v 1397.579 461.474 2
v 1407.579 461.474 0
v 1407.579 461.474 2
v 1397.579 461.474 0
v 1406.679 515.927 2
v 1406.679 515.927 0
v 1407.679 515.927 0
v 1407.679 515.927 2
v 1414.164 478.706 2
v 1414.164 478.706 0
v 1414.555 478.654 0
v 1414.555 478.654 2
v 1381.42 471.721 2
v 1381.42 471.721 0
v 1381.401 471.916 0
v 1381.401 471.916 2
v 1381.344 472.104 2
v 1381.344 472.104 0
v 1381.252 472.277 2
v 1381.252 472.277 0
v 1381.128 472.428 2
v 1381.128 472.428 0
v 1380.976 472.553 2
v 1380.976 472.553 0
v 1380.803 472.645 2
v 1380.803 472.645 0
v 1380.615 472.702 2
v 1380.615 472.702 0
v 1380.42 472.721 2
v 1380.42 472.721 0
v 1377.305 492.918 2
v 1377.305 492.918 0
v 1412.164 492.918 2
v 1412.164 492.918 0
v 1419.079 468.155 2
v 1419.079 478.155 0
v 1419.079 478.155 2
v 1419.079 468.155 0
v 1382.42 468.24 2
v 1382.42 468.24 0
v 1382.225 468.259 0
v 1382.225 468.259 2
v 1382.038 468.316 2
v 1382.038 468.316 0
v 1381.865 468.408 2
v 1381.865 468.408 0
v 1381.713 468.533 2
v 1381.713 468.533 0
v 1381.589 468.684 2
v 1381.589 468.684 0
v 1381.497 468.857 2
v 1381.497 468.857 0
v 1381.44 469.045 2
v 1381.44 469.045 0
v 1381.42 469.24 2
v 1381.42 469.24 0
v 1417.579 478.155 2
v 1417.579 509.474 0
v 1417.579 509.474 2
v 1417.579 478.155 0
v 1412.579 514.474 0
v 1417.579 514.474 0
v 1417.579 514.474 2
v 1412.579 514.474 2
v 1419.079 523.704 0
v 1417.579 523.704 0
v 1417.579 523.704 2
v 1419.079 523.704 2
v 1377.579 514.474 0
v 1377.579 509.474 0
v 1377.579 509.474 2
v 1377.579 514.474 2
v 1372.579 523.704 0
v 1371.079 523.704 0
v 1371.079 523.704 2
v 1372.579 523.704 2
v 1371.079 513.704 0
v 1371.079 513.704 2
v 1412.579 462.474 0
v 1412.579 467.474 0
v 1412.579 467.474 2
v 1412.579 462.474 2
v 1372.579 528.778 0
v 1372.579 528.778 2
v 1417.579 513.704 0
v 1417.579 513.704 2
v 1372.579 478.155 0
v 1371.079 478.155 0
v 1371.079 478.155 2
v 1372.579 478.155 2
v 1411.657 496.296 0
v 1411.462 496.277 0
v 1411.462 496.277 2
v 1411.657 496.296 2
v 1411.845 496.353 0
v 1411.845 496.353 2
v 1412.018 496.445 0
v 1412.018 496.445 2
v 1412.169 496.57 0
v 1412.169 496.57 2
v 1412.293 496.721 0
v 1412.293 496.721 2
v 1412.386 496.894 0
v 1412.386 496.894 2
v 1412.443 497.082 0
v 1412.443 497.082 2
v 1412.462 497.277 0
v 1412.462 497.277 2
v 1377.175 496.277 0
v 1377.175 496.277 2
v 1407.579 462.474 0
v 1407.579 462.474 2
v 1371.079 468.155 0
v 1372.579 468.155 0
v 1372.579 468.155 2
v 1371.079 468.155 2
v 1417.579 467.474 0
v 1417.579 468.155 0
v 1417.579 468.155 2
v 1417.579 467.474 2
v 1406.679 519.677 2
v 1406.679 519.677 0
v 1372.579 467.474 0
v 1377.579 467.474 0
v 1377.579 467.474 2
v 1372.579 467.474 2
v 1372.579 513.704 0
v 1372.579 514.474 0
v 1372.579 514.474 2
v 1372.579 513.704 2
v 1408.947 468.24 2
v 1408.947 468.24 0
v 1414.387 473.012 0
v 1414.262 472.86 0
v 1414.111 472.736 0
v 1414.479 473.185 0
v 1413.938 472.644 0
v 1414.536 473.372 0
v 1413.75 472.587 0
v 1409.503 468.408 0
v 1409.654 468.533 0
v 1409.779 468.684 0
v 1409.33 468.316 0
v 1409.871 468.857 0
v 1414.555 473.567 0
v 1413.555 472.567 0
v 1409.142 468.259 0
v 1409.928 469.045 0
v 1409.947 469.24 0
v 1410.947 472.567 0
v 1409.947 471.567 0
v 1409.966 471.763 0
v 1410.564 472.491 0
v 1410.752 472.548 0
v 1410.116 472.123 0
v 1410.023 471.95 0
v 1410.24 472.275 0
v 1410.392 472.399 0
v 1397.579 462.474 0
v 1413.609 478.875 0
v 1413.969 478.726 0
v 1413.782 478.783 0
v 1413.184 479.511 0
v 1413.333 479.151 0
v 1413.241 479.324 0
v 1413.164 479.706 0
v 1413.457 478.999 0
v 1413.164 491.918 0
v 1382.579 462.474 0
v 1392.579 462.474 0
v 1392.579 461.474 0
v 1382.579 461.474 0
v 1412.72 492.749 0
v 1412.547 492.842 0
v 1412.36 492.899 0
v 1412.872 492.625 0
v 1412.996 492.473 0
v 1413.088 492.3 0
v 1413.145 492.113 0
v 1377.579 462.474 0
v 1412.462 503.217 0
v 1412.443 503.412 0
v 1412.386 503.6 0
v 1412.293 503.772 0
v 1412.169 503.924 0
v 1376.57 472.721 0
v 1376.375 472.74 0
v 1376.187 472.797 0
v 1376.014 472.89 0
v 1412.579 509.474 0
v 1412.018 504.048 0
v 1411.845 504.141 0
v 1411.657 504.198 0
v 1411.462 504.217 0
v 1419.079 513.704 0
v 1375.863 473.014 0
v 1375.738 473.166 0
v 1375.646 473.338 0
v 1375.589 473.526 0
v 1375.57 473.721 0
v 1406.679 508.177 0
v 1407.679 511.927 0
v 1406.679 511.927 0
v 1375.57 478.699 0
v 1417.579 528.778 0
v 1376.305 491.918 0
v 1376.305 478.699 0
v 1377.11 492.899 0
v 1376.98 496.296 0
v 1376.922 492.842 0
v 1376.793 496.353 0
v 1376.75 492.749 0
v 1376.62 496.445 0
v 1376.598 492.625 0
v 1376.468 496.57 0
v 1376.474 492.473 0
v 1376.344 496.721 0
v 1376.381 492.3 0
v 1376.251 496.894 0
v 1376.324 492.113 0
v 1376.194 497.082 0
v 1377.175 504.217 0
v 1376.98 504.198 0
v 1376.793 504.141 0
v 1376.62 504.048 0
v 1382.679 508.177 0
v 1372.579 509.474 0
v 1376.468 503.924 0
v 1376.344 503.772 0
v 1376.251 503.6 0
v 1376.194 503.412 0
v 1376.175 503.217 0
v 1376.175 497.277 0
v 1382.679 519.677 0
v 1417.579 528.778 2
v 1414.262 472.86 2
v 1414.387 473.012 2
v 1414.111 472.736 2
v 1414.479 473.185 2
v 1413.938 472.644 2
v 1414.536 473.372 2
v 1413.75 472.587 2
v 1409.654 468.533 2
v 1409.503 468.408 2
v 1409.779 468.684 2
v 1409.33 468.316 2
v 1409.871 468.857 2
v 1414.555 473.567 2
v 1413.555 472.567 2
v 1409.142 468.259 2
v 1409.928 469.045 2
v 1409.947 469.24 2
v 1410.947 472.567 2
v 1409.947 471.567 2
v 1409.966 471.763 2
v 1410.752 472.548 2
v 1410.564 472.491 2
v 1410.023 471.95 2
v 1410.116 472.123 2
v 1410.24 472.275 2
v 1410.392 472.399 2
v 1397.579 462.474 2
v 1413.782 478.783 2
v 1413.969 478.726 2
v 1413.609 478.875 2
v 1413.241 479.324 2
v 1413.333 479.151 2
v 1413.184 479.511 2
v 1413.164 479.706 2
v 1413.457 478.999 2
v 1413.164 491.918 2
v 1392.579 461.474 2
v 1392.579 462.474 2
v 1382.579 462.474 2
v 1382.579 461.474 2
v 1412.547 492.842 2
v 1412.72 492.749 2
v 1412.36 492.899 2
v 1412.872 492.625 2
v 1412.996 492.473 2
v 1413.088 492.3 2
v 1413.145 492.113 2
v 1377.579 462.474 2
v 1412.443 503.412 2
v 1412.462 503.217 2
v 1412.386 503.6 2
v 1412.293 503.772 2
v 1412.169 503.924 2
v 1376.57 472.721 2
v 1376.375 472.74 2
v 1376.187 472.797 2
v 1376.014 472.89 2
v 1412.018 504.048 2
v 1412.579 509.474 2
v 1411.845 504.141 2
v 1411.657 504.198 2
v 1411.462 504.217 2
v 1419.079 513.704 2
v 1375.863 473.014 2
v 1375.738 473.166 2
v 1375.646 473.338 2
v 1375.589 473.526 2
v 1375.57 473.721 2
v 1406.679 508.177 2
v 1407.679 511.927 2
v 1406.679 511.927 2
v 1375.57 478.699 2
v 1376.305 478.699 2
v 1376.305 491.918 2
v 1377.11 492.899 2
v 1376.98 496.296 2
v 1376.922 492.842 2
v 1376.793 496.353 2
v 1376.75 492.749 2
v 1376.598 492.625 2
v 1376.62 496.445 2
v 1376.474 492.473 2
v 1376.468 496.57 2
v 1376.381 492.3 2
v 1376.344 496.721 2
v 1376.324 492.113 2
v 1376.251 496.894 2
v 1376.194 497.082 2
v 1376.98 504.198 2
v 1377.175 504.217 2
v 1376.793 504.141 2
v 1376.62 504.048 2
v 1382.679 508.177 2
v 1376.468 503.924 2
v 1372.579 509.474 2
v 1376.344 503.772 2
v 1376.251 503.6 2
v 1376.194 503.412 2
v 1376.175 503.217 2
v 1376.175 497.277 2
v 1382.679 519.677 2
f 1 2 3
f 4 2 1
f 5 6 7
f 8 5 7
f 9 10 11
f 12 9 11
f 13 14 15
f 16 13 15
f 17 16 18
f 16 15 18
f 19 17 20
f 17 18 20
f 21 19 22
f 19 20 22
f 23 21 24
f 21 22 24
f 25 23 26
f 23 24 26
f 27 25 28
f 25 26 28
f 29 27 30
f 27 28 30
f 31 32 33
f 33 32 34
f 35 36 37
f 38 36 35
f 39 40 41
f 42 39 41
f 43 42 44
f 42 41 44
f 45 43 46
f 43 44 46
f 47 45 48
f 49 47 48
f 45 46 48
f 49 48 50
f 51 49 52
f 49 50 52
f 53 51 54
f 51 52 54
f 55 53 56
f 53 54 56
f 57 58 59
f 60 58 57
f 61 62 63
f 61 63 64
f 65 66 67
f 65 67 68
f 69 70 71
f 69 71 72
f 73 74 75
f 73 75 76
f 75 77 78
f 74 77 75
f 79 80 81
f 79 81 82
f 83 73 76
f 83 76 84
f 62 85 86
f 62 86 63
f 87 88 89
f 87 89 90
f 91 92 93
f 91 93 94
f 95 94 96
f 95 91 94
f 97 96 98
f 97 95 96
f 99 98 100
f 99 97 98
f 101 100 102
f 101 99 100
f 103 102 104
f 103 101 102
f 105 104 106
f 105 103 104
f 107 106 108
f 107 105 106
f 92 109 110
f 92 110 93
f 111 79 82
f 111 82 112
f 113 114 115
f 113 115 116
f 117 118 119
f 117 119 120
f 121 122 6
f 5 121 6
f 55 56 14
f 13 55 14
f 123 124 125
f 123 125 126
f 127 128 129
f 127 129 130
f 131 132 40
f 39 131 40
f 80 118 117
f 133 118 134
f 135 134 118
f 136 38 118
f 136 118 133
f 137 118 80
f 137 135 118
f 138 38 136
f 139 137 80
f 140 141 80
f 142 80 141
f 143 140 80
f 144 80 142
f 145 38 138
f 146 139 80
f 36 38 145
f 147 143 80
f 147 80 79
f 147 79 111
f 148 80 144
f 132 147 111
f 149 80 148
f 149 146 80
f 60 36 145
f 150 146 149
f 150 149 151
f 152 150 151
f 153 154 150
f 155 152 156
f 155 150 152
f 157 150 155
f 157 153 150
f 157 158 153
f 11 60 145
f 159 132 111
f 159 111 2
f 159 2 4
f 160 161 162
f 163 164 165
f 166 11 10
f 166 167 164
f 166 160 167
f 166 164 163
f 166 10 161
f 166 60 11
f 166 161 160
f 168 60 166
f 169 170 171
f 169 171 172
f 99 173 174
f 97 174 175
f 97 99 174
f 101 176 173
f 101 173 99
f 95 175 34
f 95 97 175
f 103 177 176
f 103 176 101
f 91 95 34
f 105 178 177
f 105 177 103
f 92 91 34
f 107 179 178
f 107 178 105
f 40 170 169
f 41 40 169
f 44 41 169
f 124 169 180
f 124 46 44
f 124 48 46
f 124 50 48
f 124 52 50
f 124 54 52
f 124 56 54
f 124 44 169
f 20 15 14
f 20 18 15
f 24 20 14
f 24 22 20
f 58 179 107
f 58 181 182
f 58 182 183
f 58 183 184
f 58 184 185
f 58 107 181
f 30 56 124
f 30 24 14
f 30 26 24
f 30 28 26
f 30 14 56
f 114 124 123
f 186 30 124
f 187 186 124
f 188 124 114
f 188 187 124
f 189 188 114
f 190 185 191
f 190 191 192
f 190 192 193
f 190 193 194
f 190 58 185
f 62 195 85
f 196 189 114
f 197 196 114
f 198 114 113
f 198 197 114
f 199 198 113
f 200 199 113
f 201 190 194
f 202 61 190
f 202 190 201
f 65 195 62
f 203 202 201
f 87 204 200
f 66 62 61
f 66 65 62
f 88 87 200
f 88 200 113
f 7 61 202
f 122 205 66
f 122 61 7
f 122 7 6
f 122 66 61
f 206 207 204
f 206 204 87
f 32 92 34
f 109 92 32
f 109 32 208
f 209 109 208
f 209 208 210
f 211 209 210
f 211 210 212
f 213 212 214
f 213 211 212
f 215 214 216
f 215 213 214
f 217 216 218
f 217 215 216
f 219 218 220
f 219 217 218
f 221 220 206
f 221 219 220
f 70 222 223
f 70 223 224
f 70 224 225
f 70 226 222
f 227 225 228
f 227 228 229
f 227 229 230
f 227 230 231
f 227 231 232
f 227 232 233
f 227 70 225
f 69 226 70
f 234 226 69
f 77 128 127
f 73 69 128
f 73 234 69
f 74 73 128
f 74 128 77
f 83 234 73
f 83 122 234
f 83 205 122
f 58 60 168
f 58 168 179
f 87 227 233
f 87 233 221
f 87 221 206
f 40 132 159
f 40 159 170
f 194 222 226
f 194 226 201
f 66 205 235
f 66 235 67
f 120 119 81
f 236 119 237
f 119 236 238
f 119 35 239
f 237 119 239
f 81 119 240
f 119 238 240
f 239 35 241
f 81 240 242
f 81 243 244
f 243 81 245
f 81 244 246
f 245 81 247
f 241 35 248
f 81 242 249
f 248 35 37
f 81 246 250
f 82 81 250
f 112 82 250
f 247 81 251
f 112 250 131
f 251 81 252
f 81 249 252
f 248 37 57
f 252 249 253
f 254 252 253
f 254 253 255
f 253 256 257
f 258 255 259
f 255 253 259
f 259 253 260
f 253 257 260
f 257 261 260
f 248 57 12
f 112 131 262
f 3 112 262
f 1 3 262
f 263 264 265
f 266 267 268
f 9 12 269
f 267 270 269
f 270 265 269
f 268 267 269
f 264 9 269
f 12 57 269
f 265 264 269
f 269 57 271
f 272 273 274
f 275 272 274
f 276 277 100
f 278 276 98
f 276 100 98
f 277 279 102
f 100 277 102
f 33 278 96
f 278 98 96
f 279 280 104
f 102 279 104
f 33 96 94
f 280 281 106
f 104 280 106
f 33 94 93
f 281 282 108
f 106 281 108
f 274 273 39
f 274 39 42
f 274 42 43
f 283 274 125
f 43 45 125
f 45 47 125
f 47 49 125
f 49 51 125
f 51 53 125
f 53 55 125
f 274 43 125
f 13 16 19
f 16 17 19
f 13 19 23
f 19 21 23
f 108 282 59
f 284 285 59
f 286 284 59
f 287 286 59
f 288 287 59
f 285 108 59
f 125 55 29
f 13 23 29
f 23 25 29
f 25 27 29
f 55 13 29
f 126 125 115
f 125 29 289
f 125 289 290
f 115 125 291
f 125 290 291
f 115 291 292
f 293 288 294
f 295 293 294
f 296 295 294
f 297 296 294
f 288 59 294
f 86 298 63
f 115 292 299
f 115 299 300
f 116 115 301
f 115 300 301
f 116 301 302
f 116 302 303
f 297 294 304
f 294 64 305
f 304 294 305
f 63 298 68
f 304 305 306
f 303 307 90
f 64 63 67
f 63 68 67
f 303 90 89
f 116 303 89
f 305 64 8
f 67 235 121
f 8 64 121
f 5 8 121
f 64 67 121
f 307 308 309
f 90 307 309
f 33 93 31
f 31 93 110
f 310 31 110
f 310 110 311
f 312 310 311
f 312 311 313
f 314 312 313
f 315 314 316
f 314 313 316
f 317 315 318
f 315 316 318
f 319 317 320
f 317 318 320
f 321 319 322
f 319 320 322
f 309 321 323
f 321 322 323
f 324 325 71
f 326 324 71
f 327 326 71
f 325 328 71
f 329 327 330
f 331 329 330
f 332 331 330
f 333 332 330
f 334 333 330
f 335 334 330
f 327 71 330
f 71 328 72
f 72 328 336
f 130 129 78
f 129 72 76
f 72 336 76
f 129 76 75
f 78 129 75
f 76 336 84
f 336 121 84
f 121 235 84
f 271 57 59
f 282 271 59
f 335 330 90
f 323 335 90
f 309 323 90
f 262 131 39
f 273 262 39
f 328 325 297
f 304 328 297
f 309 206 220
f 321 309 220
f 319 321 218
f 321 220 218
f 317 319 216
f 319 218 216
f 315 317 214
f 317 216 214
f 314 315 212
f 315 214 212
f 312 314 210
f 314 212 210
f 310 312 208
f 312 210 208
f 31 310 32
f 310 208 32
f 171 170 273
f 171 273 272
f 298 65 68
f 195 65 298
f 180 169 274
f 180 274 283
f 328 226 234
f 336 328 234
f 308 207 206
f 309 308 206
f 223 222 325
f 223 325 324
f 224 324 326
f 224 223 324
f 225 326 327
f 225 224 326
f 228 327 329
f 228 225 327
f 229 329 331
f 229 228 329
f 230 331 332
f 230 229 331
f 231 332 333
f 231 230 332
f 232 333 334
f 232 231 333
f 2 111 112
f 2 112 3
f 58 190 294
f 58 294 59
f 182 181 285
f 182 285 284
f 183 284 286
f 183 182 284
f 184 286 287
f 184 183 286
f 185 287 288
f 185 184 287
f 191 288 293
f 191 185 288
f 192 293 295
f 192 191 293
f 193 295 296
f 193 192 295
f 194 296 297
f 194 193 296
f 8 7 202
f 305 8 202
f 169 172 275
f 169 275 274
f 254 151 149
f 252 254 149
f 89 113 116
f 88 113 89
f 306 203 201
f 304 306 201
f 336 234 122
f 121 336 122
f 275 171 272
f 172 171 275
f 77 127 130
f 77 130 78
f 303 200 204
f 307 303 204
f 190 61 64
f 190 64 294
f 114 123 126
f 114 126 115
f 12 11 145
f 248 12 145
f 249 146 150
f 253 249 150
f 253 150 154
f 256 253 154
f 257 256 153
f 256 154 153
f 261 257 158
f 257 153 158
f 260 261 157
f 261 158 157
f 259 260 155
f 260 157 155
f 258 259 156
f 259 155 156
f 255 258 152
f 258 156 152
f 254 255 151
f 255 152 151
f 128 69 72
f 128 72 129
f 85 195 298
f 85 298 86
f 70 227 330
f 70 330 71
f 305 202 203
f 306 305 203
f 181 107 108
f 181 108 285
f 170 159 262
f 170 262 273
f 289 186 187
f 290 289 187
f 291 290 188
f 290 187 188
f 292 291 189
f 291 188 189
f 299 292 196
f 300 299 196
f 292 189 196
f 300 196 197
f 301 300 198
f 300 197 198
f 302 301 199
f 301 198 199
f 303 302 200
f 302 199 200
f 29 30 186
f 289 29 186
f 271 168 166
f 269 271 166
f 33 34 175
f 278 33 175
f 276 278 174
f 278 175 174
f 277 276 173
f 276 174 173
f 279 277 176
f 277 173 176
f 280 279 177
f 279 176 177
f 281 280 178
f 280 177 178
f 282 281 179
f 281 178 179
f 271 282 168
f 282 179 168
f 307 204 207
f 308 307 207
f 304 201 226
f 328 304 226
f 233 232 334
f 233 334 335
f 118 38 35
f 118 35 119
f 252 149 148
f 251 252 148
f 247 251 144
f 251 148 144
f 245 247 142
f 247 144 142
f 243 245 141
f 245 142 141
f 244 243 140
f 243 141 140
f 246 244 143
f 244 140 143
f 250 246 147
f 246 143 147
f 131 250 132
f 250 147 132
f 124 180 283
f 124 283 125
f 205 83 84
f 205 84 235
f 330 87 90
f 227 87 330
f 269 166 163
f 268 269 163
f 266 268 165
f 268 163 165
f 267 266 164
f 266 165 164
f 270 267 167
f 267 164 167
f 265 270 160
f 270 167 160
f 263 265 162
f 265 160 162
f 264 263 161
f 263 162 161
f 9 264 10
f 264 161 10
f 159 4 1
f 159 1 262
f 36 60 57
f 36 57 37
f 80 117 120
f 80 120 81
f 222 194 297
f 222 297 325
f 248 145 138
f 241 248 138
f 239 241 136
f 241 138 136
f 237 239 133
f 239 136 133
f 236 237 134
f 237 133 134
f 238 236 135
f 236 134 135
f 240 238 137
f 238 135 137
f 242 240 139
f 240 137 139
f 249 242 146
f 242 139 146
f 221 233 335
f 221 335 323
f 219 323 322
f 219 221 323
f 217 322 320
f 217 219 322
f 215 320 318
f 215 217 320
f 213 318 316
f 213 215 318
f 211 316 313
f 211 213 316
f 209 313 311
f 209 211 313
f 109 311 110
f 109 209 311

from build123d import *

# Parameters (mm, degrees)
EXTRUDE_1_DEPTH = 2


with BuildPart() as part:
    # Model → 凸台-拉伸1 (new body)
    with BuildSketch(Plane.XY):
        Polygon((1417.579456282, 528.777626172), (1417.579456282, 523.704047707), (1419.079456282, 523.704047707), (1419.079456282, 513.704047707), (1417.579456282, 513.704047707), (1417.579456282, 514.474245762), (1412.579456282, 514.474245762), (1412.579456282, 509.474245762), (1417.579456282, 509.474245762), (1417.579456282, 478.155095762), (1419.079456282, 478.155095762), (1419.079456282, 468.155095762), (1417.579456282, 468.155095762), (1417.579456282, 467.474245762), (1412.579456282, 467.474245762), (1412.579456282, 462.474245762), (1407.579456282, 462.474245762), (1407.579456282, 461.474245762), (1397.579456282, 461.474245762), (1397.579456282, 462.474245762), (1392.579456282, 462.474245762), (1392.579456282, 461.474245762), (1382.579456282, 461.474245762), (1382.579456282, 462.474245762), (1377.579456282, 462.474245762), (1377.579456282, 467.474245762), (1372.579456282, 467.474245762), (1372.579456282, 468.155095762), (1371.079456282, 468.155095762), (1371.079456282, 478.155095762), (1372.579456282, 478.155095762), (1372.579456282, 509.474245762), (1377.579456282, 509.474245762), (1377.579456282, 514.474245762), (1372.579456282, 514.474245762), (1372.579456282, 513.704047707), (1371.079456282, 513.704047707), (1371.079456282, 523.704047707), (1372.579456282, 523.704047707), (1372.579456282, 528.777626172), align=None)
        with BuildLine():
            Line((1413.164476571, 491.917810861), (1413.164476571, 479.70647297))
            ThreePointArc((1413.164476571, 479.70647297), (1413.457369789, 478.999366189), (1414.164476571, 478.70647297))
            Line((1414.164476571, 478.70647297), (1414.555223152, 478.654447188))
            Line((1414.555223152, 478.654447188), (1414.555223152, 473.567457634))
            ThreePointArc((1414.555223152, 473.567457634), (1414.262329933, 472.860350852), (1413.555223152, 472.567457634))
            Line((1413.555223152, 472.567457634), (1410.947178647, 472.567457634))
            ThreePointArc((1410.947178647, 472.567457634), (1410.240071866, 472.274564415), (1409.947178647, 471.567457634))
            Line((1409.947178647, 471.567457634), (1409.947178647, 469.239749487))
            ThreePointArc((1409.947178647, 469.239749487), (1409.654285428, 468.532642706), (1408.947178647, 468.239749487))
            Line((1408.947178647, 468.239749487), (1382.420404996, 468.239749487))
            ThreePointArc((1382.420404996, 468.239749487), (1381.713298215, 468.532642706), (1381.420404996, 469.239749487))
            Line((1381.420404996, 469.239749487), (1381.420404996, 471.721090549))
            ThreePointArc((1381.420404996, 471.721090549), (1381.127511777, 472.428197331), (1380.420404996, 472.721090549))
            Line((1380.420404996, 472.721090549), (1376.569778947, 472.721090549))
            ThreePointArc((1376.569778947, 472.721090549), (1375.862672166, 473.013983768), (1375.569778947, 473.721090549))
            Line((1375.569778947, 473.721090549), (1375.569778947, 478.699498863))
            Line((1375.569778947, 478.699498863), (1376.305086446, 478.699498863))
            Line((1376.305086446, 478.699498863), (1376.305086446, 491.917810861))
            ThreePointArc((1376.305086446, 491.917810861), (1376.597979665, 492.624917642), (1377.305086446, 492.917810861))
            Line((1377.305086446, 492.917810861), (1412.164476571, 492.917810861))
            ThreePointArc((1412.164476571, 492.917810861), (1412.871583352, 492.624917642), (1413.164476571, 491.917810861))
        make_face(mode=Mode.SUBTRACT)
        Polygon((1382.679456282, 519.677225349), (1406.679456282, 519.677225349), (1406.679456282, 515.927225349), (1407.679456282, 515.927225349), (1407.679456282, 511.927225349), (1406.679456282, 511.927225349), (1406.679456282, 508.177225349), (1382.679456282, 508.177225349), align=None, mode=Mode.SUBTRACT)
        with BuildLine():
            Line((1411.462010719, 504.216917745), (1377.175235328, 504.216917745))
            ThreePointArc((1377.175235328, 504.216917745), (1376.468128547, 503.924024527), (1376.175235328, 503.216917745))
            Line((1376.175235328, 503.216917745), (1376.175235328, 497.276748548))
            ThreePointArc((1376.175235328, 497.276748548), (1376.468128547, 496.569641766), (1377.175235328, 496.276748548))
            Line((1377.175235328, 496.276748548), (1411.462010719, 496.276748548))
            ThreePointArc((1411.462010719, 496.276748548), (1412.1691175, 496.569641766), (1412.462010719, 497.276748548))
            Line((1412.462010719, 497.276748548), (1412.462010719, 503.216917745))
            ThreePointArc((1412.462010719, 503.216917745), (1412.1691175, 503.924024527), (1411.462010719, 504.216917745))
        make_face(mode=Mode.SUBTRACT)
    extrude(amount=EXTRUDE_1_DEPTH)


solid = part.part
